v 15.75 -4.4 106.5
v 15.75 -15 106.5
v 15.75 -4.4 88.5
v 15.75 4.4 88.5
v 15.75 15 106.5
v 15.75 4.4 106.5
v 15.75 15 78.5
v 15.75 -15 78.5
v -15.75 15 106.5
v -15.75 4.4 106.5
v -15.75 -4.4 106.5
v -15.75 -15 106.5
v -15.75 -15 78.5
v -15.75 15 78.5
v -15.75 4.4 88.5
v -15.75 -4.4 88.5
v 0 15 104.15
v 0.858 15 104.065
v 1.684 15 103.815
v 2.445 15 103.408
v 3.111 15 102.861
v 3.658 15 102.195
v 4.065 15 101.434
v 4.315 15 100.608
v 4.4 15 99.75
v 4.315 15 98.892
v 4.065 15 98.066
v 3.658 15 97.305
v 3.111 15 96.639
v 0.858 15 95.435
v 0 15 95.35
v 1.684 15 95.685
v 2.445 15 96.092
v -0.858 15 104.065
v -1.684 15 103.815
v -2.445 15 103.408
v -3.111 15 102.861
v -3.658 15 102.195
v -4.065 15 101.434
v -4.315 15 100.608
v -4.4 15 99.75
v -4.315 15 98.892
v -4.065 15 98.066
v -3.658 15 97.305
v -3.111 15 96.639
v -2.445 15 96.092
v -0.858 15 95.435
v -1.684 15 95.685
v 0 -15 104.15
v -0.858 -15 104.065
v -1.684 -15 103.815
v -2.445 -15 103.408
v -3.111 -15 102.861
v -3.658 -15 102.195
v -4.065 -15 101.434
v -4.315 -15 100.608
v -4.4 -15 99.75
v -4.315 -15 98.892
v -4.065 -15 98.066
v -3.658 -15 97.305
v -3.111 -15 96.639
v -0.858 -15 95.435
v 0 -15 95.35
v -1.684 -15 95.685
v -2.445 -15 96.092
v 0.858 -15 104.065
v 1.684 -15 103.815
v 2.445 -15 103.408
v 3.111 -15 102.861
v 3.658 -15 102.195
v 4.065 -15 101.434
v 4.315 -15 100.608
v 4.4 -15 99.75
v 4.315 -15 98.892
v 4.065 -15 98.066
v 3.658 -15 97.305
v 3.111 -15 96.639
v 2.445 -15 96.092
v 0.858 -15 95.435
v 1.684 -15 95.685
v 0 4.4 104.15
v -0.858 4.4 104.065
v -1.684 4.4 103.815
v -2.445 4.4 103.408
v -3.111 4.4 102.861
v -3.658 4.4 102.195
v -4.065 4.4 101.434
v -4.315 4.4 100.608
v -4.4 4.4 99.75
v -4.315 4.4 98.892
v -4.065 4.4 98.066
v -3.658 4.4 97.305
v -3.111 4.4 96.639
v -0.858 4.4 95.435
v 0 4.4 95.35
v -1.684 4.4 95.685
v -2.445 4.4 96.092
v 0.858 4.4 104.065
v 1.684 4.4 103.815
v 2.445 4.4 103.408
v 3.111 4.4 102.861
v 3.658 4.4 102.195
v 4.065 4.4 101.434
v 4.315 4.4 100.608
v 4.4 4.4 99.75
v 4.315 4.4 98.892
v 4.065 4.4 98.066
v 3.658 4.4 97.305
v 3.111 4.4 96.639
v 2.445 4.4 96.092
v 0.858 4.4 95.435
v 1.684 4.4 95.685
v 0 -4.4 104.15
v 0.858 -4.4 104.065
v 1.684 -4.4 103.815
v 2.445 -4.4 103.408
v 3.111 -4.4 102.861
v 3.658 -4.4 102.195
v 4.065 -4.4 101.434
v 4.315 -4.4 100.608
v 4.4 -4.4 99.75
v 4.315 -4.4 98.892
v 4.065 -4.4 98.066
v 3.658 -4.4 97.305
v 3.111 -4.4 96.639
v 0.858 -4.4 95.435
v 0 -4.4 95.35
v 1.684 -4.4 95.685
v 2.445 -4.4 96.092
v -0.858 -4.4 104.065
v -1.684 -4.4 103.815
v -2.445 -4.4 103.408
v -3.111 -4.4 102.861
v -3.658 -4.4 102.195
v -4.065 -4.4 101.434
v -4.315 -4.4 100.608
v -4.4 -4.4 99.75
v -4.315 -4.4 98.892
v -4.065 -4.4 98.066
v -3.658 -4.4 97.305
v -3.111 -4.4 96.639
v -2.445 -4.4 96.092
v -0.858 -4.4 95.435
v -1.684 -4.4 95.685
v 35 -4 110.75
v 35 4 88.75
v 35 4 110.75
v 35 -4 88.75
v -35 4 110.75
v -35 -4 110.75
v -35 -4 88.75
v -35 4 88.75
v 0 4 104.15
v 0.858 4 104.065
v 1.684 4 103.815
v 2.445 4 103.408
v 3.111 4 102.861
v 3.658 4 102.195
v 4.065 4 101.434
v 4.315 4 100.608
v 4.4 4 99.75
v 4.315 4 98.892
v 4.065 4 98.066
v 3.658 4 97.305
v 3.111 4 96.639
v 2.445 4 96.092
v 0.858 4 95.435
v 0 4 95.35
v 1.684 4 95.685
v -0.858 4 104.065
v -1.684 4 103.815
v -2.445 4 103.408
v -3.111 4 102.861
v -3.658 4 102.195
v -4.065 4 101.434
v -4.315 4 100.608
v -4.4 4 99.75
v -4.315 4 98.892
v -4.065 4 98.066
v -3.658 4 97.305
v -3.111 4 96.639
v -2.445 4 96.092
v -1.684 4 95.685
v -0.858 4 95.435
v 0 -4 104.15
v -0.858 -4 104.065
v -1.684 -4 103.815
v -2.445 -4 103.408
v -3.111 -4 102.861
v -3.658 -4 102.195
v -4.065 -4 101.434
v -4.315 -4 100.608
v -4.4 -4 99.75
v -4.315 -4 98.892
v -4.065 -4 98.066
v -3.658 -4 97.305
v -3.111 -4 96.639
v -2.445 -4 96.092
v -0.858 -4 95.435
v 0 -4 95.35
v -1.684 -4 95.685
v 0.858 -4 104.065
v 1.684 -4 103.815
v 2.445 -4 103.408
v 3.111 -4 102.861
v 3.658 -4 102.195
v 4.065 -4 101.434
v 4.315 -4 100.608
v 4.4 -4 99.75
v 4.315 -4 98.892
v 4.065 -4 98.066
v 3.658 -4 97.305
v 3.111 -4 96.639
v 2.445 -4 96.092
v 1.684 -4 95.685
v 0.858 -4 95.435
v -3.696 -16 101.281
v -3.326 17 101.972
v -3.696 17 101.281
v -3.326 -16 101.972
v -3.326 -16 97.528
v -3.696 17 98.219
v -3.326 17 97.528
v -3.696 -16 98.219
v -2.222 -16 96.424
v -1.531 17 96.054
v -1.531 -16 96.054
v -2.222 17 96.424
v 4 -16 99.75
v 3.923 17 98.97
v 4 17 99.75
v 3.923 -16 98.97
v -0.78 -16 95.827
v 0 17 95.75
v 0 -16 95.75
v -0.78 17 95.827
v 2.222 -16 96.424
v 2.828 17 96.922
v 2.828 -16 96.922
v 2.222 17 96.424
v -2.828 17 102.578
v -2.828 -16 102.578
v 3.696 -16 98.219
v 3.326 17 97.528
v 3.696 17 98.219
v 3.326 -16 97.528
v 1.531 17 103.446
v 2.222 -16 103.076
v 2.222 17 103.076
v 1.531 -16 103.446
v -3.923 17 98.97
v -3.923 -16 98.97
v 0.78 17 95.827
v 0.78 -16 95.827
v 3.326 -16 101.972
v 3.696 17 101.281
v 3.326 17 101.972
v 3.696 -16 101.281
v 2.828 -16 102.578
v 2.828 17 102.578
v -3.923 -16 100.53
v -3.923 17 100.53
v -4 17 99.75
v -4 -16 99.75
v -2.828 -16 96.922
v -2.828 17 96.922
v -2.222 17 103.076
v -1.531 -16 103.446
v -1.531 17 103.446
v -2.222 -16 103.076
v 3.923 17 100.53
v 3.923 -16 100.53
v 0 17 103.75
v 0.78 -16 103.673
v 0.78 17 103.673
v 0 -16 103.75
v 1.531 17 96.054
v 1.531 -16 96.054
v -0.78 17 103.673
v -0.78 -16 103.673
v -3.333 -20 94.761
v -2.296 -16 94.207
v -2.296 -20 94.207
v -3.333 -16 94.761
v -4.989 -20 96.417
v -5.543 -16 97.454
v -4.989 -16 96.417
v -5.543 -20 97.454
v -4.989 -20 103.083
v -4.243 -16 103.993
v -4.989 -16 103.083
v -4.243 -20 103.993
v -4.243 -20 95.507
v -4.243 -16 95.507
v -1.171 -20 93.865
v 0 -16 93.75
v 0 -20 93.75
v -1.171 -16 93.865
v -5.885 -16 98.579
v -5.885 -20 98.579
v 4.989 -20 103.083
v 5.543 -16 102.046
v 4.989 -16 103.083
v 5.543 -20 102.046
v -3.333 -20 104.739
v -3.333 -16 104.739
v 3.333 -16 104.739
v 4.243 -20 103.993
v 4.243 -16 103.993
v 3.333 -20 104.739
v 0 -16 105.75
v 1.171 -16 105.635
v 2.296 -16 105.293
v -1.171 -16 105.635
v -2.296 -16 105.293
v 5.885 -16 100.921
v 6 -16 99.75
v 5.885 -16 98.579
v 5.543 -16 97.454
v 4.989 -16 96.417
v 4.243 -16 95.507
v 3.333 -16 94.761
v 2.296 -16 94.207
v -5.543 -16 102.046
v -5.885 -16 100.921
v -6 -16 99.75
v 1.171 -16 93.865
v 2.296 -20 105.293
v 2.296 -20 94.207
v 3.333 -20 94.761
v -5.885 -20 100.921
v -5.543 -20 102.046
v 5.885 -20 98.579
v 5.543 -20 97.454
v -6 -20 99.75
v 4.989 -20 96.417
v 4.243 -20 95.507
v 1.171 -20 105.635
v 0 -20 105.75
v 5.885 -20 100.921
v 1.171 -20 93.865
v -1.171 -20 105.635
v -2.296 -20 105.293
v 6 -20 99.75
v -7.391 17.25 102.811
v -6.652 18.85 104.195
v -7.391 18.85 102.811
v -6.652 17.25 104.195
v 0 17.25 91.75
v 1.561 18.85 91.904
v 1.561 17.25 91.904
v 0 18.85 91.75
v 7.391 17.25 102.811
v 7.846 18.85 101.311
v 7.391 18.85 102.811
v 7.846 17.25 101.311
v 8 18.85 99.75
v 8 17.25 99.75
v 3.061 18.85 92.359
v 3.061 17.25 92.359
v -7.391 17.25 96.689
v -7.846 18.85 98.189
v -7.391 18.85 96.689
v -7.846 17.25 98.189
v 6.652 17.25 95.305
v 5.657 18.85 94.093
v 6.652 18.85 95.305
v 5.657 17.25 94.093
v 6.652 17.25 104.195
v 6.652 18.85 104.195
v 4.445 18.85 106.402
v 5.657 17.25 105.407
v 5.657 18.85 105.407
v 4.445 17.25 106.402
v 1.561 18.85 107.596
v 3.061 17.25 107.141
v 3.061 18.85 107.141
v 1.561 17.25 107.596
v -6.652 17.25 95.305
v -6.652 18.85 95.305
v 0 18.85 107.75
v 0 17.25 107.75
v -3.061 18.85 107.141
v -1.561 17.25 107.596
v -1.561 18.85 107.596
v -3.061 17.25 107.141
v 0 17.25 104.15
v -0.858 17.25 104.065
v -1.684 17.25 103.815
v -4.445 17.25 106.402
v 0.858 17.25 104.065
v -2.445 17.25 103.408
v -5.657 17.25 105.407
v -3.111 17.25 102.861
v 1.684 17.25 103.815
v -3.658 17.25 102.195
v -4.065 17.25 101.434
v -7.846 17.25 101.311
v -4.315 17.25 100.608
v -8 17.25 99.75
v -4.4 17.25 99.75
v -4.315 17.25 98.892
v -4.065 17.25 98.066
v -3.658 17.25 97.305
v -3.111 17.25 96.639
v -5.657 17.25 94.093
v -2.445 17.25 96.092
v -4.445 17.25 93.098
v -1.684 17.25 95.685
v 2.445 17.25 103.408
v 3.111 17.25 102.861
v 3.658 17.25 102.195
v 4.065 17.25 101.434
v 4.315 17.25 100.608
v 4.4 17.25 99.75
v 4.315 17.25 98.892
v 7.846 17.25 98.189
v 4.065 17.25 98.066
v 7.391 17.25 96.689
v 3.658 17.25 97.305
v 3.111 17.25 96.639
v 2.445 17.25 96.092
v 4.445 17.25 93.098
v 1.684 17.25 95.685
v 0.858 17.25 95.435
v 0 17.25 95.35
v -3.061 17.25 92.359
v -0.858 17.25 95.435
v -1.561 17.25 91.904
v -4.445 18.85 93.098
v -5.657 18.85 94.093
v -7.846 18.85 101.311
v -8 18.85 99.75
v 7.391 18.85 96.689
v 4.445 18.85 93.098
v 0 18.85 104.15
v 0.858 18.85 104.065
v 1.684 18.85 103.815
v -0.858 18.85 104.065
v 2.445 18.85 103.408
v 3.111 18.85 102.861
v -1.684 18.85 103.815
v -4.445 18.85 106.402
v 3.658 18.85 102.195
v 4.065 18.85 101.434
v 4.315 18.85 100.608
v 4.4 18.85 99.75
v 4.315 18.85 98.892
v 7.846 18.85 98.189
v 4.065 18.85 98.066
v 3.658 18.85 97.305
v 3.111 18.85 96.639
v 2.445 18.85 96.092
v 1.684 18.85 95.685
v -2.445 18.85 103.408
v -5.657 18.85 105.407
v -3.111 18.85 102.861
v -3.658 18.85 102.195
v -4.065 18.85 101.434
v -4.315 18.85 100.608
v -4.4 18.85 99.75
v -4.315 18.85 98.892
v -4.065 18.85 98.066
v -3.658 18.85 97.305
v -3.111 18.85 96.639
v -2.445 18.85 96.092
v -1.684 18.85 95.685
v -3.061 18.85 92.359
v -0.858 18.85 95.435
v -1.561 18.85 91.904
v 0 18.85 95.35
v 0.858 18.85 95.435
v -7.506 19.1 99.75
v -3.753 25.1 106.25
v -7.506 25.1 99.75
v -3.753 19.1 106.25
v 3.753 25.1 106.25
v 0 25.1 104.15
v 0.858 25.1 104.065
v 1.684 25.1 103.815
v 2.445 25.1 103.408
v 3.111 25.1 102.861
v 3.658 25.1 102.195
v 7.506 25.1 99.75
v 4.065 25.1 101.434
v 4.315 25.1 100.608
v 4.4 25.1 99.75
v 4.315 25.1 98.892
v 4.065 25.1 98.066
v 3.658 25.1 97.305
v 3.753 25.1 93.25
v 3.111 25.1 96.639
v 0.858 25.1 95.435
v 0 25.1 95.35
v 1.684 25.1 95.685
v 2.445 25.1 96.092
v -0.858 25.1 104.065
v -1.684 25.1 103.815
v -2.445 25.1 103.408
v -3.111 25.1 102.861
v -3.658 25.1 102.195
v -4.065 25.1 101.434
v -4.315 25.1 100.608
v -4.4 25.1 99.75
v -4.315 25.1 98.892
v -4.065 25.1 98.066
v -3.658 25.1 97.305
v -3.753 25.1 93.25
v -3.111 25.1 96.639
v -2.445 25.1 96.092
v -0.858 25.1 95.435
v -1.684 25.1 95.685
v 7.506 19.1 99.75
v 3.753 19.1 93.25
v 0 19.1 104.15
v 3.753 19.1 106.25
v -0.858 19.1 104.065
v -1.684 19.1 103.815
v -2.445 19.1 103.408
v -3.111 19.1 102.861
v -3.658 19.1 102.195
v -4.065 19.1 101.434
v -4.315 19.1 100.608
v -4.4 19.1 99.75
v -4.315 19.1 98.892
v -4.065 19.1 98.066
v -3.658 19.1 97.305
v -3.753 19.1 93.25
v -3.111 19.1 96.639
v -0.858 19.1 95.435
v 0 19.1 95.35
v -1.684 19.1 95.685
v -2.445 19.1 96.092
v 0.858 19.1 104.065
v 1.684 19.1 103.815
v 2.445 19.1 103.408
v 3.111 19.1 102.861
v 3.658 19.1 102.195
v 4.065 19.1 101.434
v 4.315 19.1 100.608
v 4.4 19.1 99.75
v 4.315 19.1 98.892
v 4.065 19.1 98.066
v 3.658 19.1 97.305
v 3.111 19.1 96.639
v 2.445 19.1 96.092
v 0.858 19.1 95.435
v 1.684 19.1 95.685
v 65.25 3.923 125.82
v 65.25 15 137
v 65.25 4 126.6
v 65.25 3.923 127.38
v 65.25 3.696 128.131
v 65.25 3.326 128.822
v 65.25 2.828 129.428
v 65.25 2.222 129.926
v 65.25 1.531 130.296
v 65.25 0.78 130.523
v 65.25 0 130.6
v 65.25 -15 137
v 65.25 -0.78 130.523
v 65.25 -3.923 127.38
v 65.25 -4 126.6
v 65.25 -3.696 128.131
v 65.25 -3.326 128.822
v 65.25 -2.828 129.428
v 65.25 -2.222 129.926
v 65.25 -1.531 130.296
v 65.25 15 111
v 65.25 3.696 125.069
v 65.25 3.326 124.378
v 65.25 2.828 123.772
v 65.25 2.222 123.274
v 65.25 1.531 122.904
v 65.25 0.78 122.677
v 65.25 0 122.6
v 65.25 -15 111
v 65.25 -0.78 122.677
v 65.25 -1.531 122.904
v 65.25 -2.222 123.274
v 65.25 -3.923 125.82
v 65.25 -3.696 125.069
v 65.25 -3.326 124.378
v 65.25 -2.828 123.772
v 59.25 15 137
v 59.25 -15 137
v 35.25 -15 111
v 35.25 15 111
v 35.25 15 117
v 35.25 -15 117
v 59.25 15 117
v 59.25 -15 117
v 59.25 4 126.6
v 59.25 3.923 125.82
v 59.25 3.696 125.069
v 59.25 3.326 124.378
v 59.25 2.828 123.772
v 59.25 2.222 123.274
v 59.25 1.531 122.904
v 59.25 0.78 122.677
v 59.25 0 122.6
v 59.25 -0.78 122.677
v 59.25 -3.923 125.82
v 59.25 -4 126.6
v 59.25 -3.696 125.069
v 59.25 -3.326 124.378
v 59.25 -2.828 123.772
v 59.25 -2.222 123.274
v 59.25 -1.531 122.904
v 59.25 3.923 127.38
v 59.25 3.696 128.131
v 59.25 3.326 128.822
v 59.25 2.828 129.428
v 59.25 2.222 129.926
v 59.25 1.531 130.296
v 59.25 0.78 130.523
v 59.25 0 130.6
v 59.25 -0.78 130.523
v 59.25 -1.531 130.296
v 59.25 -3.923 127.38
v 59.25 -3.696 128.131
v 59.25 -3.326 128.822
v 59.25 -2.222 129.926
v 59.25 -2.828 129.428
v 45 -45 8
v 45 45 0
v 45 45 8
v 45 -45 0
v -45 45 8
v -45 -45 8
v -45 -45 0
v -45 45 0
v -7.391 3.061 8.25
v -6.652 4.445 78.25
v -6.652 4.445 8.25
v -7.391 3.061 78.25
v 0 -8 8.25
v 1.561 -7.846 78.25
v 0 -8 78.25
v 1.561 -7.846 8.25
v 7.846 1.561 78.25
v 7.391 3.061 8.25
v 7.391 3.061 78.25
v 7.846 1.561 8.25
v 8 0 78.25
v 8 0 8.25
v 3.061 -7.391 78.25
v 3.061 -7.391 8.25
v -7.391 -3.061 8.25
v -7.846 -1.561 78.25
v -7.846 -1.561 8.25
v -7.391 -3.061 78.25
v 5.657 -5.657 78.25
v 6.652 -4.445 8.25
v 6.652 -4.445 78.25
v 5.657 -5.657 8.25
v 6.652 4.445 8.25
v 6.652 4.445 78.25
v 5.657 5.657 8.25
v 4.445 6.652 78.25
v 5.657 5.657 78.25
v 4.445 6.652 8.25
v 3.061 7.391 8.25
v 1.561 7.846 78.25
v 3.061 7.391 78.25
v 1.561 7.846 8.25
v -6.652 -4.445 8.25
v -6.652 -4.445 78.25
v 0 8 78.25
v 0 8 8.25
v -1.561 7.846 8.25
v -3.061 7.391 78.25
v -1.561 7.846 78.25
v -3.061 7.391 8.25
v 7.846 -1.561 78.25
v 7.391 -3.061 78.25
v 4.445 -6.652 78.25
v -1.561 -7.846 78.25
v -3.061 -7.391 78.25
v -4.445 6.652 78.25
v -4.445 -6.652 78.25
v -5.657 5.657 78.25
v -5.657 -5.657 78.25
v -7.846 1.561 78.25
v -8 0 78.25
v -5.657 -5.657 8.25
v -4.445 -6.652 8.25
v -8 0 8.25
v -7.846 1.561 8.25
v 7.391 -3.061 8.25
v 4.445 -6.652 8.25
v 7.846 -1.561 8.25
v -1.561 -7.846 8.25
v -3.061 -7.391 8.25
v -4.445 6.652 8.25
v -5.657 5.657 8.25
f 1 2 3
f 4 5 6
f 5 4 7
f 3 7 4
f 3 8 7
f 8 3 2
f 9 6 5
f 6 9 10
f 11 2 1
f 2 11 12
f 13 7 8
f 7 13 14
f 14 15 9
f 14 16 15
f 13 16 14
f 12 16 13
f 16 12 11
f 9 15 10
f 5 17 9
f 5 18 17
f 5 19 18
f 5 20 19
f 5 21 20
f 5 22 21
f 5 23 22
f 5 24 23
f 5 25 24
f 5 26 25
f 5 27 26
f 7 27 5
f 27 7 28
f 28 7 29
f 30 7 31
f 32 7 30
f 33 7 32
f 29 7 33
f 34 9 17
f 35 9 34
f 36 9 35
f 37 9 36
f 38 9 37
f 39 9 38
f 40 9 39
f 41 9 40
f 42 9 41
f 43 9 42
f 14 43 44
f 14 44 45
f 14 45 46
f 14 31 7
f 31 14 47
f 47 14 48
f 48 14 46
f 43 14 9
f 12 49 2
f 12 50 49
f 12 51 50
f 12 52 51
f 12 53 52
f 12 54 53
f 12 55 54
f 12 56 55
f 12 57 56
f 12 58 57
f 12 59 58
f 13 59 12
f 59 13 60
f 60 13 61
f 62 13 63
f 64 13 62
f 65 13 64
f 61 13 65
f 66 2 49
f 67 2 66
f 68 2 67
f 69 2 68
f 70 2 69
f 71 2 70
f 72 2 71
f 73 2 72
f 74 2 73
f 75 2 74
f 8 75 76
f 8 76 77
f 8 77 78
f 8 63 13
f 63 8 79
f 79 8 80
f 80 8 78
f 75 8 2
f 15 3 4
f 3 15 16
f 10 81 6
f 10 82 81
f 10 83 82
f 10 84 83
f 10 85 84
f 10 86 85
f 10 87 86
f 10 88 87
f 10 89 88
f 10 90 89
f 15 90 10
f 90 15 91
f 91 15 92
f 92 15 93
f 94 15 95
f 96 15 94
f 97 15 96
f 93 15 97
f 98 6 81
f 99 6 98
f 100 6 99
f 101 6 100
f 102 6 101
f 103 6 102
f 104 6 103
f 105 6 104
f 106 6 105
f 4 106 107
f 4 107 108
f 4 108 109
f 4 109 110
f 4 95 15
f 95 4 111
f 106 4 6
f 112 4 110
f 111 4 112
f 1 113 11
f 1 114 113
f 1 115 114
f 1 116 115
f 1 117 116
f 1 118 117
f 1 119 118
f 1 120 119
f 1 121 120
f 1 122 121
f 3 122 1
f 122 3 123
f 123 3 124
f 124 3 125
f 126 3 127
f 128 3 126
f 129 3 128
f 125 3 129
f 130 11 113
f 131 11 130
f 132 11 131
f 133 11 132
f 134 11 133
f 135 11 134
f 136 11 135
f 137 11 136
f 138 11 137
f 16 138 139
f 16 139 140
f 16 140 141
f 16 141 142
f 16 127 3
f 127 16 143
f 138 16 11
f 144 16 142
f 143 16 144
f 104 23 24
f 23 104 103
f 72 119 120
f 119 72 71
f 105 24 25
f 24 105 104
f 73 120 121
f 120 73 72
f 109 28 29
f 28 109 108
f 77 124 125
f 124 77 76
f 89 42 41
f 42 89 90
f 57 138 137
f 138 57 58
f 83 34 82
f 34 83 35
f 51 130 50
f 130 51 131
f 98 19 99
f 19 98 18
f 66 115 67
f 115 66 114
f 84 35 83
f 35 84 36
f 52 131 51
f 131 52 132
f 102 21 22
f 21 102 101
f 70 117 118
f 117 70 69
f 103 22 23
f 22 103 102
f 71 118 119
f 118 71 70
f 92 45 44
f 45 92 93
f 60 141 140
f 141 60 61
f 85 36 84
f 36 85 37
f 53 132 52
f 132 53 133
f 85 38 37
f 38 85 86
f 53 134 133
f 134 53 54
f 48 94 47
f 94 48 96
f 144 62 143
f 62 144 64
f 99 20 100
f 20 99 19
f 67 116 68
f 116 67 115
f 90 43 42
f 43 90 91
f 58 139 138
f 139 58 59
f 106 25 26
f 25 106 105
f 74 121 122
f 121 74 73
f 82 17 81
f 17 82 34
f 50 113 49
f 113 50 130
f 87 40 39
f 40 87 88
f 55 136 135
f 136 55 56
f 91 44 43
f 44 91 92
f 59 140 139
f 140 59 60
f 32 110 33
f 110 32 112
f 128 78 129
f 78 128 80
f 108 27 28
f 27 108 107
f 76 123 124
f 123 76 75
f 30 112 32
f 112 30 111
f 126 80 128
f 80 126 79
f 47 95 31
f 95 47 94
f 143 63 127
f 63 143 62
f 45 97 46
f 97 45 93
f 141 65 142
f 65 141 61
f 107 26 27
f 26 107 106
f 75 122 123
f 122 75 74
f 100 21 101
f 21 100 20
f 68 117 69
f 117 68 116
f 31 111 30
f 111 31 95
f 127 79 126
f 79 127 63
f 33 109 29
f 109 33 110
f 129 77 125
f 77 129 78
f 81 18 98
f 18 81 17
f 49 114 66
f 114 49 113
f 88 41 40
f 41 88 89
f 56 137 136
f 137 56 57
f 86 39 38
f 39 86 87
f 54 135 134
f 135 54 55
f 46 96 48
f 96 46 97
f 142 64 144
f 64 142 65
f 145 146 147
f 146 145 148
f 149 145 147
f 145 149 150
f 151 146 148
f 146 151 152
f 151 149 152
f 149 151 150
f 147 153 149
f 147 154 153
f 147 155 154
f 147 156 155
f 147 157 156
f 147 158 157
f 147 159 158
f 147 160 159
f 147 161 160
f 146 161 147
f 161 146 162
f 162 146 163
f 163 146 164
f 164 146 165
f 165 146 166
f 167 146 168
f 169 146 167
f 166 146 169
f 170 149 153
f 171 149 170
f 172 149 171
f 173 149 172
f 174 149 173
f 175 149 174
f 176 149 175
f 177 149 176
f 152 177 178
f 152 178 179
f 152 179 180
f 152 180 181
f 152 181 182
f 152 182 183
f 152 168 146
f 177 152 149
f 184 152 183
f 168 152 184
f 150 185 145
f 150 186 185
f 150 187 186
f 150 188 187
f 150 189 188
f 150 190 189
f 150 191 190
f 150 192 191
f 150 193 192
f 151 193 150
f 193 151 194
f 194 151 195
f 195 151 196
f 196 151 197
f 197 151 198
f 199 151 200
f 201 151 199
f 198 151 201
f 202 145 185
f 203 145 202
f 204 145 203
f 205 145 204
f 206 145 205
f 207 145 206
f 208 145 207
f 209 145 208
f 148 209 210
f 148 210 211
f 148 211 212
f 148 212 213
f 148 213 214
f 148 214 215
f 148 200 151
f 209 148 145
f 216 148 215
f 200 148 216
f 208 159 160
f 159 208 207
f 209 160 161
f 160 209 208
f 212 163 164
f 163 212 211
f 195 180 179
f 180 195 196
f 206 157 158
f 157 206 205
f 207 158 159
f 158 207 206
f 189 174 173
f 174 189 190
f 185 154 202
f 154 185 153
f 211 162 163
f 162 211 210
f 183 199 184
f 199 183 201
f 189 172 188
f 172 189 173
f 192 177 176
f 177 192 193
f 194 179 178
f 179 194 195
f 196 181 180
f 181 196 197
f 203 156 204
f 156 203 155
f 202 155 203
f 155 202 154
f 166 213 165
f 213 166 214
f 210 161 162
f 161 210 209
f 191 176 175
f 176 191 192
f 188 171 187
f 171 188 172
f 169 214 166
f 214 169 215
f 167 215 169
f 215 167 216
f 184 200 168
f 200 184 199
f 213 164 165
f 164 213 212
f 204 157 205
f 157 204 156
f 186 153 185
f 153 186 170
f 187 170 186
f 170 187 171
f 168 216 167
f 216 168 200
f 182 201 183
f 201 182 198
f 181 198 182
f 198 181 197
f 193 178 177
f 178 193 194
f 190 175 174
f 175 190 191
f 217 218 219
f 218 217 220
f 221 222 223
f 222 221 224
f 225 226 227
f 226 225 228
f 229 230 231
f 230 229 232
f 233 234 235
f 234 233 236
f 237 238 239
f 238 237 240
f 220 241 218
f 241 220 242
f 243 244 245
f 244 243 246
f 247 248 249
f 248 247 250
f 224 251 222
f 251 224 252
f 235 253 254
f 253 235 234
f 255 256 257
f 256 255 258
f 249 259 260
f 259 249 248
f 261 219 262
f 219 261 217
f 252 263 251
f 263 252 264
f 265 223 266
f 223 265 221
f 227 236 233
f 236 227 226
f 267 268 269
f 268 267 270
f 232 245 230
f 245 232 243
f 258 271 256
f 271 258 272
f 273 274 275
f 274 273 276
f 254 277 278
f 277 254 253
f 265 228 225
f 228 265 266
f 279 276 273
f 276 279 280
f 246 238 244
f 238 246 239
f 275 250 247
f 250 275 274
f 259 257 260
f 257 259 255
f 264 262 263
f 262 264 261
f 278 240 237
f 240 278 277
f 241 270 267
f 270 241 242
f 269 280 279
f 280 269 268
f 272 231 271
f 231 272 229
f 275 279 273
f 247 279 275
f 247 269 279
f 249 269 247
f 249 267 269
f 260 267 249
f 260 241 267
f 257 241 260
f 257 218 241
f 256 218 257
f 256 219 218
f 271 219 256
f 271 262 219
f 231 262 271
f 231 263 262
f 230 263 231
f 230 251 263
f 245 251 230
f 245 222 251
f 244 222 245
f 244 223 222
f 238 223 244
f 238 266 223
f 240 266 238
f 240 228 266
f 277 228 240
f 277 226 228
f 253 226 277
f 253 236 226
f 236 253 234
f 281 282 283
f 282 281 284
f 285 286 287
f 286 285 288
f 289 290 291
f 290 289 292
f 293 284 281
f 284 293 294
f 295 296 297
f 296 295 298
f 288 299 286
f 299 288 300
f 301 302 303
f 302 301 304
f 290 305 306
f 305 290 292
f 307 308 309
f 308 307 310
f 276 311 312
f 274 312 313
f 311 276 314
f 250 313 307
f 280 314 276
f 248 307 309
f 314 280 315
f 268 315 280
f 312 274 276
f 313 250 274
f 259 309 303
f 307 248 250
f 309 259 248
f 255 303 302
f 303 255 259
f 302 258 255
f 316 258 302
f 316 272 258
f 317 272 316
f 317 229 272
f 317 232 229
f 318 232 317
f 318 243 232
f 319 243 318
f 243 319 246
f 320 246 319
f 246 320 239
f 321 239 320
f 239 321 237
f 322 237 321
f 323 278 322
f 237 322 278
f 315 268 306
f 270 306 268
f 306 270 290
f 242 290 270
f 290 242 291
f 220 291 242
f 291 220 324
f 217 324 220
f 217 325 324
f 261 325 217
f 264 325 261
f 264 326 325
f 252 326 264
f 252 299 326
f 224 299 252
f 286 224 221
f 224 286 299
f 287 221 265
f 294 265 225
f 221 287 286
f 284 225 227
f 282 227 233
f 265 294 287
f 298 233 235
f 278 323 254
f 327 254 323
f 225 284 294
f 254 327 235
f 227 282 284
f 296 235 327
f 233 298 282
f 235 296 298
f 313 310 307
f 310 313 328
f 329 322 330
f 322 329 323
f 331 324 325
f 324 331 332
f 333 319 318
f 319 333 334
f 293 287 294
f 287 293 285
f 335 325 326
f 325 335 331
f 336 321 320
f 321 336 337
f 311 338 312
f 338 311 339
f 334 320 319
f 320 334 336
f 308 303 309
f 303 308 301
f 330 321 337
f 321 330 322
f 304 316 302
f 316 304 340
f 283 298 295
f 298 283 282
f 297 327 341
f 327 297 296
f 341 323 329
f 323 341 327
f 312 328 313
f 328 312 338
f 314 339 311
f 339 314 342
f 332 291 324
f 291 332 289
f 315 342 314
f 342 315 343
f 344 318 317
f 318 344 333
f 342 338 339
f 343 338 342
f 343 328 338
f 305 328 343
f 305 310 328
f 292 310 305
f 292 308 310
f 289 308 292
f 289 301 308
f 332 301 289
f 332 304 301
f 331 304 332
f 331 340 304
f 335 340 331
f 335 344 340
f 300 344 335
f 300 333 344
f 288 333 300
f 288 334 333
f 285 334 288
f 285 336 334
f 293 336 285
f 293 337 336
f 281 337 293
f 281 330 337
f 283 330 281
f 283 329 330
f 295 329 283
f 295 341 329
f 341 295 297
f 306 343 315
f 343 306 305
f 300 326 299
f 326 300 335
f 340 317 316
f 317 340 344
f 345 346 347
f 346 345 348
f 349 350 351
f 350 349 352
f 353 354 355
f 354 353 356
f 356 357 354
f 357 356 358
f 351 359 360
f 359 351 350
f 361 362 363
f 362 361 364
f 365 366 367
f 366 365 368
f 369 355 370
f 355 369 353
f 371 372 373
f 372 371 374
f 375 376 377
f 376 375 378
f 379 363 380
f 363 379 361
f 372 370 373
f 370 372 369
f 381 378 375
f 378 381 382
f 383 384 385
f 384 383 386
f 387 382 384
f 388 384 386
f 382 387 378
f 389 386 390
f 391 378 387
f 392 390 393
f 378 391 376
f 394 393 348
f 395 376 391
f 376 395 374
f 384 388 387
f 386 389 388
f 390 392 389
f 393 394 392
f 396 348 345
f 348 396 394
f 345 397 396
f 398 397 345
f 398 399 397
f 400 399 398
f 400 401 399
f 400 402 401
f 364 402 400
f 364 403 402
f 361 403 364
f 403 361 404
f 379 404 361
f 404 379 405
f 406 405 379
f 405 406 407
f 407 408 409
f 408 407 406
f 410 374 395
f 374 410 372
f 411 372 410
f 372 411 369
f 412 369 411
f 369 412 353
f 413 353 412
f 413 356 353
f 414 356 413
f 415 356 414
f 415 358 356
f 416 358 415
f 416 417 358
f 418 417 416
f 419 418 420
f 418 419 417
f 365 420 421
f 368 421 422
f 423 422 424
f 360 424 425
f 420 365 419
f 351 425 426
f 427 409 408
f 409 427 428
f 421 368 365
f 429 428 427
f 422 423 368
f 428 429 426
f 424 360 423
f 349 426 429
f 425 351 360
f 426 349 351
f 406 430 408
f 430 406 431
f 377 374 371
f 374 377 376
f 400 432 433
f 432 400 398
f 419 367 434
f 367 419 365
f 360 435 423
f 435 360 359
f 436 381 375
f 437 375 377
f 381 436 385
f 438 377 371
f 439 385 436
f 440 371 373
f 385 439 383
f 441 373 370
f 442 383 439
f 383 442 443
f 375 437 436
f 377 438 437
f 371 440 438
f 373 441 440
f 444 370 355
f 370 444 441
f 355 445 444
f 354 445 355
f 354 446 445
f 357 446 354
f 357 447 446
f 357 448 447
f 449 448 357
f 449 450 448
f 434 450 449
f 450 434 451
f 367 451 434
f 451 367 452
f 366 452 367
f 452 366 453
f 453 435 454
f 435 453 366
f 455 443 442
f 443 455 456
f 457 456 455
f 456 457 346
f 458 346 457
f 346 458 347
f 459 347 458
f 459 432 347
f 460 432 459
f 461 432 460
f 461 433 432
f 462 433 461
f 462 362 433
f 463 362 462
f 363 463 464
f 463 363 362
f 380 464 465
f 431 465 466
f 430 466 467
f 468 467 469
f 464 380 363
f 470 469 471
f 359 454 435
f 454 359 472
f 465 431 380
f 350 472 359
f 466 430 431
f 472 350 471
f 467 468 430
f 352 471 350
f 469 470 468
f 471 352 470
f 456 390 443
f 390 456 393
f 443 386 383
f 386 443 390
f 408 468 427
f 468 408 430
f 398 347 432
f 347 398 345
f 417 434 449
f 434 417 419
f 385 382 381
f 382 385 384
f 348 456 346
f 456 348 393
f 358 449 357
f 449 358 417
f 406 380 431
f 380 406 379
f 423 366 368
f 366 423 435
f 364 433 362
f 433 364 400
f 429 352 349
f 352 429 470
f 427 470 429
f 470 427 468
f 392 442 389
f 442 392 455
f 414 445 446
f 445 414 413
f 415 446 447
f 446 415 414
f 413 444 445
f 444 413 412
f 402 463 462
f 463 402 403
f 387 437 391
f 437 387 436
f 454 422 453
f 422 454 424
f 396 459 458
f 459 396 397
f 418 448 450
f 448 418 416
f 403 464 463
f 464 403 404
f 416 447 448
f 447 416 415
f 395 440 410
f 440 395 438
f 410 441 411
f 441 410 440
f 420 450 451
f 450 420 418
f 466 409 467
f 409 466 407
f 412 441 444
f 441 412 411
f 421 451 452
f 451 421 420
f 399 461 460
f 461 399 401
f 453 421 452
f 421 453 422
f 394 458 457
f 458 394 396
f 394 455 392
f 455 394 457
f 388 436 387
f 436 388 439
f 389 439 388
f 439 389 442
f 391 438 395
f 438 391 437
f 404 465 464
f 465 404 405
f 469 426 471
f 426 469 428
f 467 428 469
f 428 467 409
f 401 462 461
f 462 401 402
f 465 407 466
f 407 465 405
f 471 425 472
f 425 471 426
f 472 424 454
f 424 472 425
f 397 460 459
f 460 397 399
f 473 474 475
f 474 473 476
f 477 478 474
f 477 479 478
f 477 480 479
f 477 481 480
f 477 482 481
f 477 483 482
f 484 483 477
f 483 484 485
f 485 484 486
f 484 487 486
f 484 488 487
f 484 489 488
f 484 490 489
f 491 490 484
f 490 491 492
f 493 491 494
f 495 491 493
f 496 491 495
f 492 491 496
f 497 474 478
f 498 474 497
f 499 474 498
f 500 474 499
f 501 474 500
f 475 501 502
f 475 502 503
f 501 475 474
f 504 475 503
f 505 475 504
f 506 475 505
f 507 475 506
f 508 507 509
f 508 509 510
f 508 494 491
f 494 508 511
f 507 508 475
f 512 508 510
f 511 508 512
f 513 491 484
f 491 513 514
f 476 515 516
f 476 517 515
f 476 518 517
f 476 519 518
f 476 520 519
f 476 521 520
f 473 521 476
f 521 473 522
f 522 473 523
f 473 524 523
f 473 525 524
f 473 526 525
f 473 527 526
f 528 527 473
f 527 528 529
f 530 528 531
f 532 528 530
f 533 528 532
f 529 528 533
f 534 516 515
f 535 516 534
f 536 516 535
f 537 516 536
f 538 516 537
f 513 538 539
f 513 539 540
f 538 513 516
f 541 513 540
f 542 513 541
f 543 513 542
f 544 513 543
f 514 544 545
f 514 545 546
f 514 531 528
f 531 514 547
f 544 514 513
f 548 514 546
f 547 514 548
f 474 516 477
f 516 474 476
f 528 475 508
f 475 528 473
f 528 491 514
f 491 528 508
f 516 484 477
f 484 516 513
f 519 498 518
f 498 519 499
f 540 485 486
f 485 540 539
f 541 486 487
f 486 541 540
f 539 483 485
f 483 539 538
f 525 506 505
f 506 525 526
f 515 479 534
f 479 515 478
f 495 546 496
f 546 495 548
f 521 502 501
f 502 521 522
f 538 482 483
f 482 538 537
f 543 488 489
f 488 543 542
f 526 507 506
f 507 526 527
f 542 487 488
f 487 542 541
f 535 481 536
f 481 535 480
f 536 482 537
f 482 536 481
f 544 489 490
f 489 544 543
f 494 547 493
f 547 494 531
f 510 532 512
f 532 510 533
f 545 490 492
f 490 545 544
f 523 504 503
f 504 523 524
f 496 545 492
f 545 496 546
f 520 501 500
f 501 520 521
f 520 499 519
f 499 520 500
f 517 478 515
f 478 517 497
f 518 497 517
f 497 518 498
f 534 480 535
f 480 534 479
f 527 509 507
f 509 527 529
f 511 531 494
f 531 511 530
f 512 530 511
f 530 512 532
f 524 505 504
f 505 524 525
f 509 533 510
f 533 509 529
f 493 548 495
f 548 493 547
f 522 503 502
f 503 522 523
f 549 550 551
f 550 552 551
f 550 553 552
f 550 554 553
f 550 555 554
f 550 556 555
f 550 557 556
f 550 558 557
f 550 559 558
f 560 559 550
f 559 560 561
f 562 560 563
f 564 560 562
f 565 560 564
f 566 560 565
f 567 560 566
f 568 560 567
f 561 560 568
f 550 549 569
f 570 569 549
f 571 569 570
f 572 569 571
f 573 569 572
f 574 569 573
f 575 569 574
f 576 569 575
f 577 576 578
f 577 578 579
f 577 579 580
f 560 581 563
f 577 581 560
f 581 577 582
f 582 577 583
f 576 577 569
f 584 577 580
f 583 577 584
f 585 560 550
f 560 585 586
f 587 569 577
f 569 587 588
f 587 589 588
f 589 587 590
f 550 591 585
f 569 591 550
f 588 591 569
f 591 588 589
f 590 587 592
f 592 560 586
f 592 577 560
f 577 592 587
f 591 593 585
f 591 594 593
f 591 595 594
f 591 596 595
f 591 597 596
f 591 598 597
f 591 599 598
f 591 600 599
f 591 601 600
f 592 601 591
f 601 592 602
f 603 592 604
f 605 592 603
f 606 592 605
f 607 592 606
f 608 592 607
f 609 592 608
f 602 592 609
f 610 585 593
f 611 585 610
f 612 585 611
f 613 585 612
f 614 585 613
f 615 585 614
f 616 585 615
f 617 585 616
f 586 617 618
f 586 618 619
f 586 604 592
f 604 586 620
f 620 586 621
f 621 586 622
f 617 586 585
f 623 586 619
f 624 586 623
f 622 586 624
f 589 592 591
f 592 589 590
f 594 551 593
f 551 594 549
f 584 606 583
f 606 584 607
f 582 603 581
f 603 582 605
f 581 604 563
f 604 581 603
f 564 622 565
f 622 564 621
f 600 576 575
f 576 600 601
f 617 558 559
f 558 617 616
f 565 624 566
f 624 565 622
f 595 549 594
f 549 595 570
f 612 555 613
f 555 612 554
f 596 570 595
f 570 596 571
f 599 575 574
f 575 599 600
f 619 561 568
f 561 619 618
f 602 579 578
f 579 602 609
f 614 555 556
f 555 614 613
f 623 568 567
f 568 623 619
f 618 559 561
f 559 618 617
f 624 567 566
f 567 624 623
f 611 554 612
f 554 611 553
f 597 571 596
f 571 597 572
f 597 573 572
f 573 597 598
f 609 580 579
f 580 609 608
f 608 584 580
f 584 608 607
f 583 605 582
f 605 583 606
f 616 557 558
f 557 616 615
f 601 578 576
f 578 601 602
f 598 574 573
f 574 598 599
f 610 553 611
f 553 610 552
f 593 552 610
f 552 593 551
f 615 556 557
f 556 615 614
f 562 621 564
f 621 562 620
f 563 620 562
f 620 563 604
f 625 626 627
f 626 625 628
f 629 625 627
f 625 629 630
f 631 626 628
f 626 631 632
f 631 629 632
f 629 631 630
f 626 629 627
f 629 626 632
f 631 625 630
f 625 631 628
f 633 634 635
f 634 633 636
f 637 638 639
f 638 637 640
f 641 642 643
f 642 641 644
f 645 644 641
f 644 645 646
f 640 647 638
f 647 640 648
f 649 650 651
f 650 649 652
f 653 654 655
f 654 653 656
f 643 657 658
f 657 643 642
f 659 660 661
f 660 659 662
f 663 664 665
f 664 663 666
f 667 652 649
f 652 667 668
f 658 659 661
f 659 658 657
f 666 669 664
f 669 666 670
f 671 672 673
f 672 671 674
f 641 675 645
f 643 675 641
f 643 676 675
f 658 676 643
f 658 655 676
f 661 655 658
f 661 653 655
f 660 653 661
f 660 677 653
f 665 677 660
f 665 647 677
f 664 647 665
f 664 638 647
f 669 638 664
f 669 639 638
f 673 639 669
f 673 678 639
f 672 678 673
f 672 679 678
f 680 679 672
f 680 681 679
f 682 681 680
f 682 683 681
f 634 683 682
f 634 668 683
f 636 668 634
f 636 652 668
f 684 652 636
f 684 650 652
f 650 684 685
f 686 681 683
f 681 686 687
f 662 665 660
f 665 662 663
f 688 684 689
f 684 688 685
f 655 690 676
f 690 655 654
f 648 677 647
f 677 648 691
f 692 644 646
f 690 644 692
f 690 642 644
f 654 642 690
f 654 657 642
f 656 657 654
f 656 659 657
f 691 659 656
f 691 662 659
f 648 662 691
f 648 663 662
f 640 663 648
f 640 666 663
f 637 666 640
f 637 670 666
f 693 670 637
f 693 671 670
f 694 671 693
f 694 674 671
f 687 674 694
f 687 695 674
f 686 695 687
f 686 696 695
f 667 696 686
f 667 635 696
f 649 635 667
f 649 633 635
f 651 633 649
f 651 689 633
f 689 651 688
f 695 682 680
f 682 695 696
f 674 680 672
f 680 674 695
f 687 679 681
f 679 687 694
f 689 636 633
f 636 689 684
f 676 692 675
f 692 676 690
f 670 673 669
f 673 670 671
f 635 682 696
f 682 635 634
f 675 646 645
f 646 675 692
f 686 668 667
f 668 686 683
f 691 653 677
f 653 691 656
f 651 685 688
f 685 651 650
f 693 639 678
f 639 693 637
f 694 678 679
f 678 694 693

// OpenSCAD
$fn = 32;

// ------------------------------------------------------------------------
// Lamp arm: column d16 x 70 mm, arm 70 mm
// Every part is its own module, assembly() places every instance.
// ------------------------------------------------------------------------

// --- part 1 ---
module lamp_base() {
  difference() {
    translate([-45, -45, 0]) cube([90, 90, 8]);
  }
}

// --- part 2 ---
module lamp_column() {
  cylinder(h = 70, d = 16);
}

// --- part 3 ---
module head_fork() {
  difference() {
    translate([-15.75, -15, 0]) cube([31.5, 30, 28]);
    translate([-16.75, -4.4, 10]) cube([33.5, 8.8, 19]);
    translate([0, 0, 21.25]) rotate([90, 0, 0]) cylinder(h = 32, d = 8.8, center = true);
  }
}

// --- part 4 ---
module lamp_arm() {
  difference() {
    translate([-35, -4, 0]) cube([70, 8, 22]);
    translate([0, 0, 11]) rotate([90, 0, 0]) cylinder(h = 10, d = 8.8, center = true);
  }
}

// --- part 5 ---
module arm_pin() {
  rotate([0, 90, 0]) cylinder(h = 34, d = 8, center = true);
  translate([-20, 0, 0]) rotate([0, 90, 0]) cylinder(h = 4, d = 12);
}

// --- part 6 ---
module arm_washer() {
  difference() {
      translate([0, 0, 0]) cylinder(h = 1.6, d = 16);
      translate([0, 0, -1]) cylinder(h = 3.6, d = 8.8);
    }
}

// --- part 7 ---
module arm_nut() {
  difference() {
    linear_extrude(height = 6) polygon(points = [[7.506, 0], [3.753, 6.5], [-3.753, 6.5], [-7.506, 0], [-3.753, -6.5], [3.753, -6.5]]);
    translate([0, 0, -1]) cylinder(h = 8, d = 8.8);
  }
}

// --- part 8 ---
module shade_bracket() {
  difference() {
    translate([-15, -15, 0]) cube([30, 30, 26]);
    translate([-16, -16, 6]) cube([25, 32, 21]);
    translate([12, 0, 15.6]) rotate([0, 90, 0]) cylinder(h = 8, d = 8, center = true);
  }
}

// --- assembly ---
module assembly() {
  color([0.80, 0.24, 0.20]) translate([0, 0, 0]) rotate([0, 0, 0]) lamp_base();
  color([0.20, 0.45, 0.75]) translate([0, 0, 8.25]) rotate([0, 0, 0]) lamp_column();
  color([0.25, 0.62, 0.32]) translate([0, 0, 78.5]) rotate([0, 0, 0]) head_fork();
  color([0.92, 0.70, 0.18]) translate([0, 0, 88.75]) rotate([0, 0, 0]) lamp_arm();
  color([0.58, 0.35, 0.70]) translate([0, 0, 99.75]) rotate([0, 0, 90]) arm_pin();
  color([0.16, 0.66, 0.66]) translate([0, 18.85, 99.75]) rotate([90, 0, 0]) arm_washer();
  color([0.85, 0.48, 0.18]) translate([0, 25.1, 99.75]) rotate([90, 0, 0]) arm_nut();
  color([0.55, 0.60, 0.65]) translate([50.25, 0, 111]) rotate([0, 0, 0]) shade_bracket();
}

assembly();
